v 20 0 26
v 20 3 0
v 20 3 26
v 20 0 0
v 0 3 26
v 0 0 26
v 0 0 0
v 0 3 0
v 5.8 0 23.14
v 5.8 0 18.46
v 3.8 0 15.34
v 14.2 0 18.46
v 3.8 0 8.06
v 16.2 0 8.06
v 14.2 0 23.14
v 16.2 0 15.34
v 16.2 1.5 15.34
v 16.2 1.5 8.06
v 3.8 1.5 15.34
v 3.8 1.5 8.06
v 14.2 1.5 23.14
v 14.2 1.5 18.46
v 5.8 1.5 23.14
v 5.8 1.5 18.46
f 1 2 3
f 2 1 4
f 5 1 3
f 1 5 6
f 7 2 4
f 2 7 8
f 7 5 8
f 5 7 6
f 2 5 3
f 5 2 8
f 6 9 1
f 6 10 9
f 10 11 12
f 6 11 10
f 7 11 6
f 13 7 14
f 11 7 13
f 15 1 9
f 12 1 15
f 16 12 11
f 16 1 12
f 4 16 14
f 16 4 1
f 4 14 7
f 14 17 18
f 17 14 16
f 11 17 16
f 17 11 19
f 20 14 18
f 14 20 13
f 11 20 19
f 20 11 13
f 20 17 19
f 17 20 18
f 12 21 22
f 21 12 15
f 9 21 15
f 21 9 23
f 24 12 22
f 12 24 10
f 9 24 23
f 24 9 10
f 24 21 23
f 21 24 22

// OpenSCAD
// DIN-rail retaining clip.
$fn = 60;
eps = 0.02;
clip_w = 20;
clip_h = 26;
clip_t = 3;
difference() { cube([clip_w,clip_t,clip_h]); translate([clip_w/2, -eps, clip_h*0.45]) cube([clip_w*0.62,clip_t+2*eps,clip_h*0.28],center=true); translate([clip_w/2, -eps, clip_h*0.8]) cube([clip_w*0.42,clip_t+2*eps,clip_h*0.18],center=true); }
